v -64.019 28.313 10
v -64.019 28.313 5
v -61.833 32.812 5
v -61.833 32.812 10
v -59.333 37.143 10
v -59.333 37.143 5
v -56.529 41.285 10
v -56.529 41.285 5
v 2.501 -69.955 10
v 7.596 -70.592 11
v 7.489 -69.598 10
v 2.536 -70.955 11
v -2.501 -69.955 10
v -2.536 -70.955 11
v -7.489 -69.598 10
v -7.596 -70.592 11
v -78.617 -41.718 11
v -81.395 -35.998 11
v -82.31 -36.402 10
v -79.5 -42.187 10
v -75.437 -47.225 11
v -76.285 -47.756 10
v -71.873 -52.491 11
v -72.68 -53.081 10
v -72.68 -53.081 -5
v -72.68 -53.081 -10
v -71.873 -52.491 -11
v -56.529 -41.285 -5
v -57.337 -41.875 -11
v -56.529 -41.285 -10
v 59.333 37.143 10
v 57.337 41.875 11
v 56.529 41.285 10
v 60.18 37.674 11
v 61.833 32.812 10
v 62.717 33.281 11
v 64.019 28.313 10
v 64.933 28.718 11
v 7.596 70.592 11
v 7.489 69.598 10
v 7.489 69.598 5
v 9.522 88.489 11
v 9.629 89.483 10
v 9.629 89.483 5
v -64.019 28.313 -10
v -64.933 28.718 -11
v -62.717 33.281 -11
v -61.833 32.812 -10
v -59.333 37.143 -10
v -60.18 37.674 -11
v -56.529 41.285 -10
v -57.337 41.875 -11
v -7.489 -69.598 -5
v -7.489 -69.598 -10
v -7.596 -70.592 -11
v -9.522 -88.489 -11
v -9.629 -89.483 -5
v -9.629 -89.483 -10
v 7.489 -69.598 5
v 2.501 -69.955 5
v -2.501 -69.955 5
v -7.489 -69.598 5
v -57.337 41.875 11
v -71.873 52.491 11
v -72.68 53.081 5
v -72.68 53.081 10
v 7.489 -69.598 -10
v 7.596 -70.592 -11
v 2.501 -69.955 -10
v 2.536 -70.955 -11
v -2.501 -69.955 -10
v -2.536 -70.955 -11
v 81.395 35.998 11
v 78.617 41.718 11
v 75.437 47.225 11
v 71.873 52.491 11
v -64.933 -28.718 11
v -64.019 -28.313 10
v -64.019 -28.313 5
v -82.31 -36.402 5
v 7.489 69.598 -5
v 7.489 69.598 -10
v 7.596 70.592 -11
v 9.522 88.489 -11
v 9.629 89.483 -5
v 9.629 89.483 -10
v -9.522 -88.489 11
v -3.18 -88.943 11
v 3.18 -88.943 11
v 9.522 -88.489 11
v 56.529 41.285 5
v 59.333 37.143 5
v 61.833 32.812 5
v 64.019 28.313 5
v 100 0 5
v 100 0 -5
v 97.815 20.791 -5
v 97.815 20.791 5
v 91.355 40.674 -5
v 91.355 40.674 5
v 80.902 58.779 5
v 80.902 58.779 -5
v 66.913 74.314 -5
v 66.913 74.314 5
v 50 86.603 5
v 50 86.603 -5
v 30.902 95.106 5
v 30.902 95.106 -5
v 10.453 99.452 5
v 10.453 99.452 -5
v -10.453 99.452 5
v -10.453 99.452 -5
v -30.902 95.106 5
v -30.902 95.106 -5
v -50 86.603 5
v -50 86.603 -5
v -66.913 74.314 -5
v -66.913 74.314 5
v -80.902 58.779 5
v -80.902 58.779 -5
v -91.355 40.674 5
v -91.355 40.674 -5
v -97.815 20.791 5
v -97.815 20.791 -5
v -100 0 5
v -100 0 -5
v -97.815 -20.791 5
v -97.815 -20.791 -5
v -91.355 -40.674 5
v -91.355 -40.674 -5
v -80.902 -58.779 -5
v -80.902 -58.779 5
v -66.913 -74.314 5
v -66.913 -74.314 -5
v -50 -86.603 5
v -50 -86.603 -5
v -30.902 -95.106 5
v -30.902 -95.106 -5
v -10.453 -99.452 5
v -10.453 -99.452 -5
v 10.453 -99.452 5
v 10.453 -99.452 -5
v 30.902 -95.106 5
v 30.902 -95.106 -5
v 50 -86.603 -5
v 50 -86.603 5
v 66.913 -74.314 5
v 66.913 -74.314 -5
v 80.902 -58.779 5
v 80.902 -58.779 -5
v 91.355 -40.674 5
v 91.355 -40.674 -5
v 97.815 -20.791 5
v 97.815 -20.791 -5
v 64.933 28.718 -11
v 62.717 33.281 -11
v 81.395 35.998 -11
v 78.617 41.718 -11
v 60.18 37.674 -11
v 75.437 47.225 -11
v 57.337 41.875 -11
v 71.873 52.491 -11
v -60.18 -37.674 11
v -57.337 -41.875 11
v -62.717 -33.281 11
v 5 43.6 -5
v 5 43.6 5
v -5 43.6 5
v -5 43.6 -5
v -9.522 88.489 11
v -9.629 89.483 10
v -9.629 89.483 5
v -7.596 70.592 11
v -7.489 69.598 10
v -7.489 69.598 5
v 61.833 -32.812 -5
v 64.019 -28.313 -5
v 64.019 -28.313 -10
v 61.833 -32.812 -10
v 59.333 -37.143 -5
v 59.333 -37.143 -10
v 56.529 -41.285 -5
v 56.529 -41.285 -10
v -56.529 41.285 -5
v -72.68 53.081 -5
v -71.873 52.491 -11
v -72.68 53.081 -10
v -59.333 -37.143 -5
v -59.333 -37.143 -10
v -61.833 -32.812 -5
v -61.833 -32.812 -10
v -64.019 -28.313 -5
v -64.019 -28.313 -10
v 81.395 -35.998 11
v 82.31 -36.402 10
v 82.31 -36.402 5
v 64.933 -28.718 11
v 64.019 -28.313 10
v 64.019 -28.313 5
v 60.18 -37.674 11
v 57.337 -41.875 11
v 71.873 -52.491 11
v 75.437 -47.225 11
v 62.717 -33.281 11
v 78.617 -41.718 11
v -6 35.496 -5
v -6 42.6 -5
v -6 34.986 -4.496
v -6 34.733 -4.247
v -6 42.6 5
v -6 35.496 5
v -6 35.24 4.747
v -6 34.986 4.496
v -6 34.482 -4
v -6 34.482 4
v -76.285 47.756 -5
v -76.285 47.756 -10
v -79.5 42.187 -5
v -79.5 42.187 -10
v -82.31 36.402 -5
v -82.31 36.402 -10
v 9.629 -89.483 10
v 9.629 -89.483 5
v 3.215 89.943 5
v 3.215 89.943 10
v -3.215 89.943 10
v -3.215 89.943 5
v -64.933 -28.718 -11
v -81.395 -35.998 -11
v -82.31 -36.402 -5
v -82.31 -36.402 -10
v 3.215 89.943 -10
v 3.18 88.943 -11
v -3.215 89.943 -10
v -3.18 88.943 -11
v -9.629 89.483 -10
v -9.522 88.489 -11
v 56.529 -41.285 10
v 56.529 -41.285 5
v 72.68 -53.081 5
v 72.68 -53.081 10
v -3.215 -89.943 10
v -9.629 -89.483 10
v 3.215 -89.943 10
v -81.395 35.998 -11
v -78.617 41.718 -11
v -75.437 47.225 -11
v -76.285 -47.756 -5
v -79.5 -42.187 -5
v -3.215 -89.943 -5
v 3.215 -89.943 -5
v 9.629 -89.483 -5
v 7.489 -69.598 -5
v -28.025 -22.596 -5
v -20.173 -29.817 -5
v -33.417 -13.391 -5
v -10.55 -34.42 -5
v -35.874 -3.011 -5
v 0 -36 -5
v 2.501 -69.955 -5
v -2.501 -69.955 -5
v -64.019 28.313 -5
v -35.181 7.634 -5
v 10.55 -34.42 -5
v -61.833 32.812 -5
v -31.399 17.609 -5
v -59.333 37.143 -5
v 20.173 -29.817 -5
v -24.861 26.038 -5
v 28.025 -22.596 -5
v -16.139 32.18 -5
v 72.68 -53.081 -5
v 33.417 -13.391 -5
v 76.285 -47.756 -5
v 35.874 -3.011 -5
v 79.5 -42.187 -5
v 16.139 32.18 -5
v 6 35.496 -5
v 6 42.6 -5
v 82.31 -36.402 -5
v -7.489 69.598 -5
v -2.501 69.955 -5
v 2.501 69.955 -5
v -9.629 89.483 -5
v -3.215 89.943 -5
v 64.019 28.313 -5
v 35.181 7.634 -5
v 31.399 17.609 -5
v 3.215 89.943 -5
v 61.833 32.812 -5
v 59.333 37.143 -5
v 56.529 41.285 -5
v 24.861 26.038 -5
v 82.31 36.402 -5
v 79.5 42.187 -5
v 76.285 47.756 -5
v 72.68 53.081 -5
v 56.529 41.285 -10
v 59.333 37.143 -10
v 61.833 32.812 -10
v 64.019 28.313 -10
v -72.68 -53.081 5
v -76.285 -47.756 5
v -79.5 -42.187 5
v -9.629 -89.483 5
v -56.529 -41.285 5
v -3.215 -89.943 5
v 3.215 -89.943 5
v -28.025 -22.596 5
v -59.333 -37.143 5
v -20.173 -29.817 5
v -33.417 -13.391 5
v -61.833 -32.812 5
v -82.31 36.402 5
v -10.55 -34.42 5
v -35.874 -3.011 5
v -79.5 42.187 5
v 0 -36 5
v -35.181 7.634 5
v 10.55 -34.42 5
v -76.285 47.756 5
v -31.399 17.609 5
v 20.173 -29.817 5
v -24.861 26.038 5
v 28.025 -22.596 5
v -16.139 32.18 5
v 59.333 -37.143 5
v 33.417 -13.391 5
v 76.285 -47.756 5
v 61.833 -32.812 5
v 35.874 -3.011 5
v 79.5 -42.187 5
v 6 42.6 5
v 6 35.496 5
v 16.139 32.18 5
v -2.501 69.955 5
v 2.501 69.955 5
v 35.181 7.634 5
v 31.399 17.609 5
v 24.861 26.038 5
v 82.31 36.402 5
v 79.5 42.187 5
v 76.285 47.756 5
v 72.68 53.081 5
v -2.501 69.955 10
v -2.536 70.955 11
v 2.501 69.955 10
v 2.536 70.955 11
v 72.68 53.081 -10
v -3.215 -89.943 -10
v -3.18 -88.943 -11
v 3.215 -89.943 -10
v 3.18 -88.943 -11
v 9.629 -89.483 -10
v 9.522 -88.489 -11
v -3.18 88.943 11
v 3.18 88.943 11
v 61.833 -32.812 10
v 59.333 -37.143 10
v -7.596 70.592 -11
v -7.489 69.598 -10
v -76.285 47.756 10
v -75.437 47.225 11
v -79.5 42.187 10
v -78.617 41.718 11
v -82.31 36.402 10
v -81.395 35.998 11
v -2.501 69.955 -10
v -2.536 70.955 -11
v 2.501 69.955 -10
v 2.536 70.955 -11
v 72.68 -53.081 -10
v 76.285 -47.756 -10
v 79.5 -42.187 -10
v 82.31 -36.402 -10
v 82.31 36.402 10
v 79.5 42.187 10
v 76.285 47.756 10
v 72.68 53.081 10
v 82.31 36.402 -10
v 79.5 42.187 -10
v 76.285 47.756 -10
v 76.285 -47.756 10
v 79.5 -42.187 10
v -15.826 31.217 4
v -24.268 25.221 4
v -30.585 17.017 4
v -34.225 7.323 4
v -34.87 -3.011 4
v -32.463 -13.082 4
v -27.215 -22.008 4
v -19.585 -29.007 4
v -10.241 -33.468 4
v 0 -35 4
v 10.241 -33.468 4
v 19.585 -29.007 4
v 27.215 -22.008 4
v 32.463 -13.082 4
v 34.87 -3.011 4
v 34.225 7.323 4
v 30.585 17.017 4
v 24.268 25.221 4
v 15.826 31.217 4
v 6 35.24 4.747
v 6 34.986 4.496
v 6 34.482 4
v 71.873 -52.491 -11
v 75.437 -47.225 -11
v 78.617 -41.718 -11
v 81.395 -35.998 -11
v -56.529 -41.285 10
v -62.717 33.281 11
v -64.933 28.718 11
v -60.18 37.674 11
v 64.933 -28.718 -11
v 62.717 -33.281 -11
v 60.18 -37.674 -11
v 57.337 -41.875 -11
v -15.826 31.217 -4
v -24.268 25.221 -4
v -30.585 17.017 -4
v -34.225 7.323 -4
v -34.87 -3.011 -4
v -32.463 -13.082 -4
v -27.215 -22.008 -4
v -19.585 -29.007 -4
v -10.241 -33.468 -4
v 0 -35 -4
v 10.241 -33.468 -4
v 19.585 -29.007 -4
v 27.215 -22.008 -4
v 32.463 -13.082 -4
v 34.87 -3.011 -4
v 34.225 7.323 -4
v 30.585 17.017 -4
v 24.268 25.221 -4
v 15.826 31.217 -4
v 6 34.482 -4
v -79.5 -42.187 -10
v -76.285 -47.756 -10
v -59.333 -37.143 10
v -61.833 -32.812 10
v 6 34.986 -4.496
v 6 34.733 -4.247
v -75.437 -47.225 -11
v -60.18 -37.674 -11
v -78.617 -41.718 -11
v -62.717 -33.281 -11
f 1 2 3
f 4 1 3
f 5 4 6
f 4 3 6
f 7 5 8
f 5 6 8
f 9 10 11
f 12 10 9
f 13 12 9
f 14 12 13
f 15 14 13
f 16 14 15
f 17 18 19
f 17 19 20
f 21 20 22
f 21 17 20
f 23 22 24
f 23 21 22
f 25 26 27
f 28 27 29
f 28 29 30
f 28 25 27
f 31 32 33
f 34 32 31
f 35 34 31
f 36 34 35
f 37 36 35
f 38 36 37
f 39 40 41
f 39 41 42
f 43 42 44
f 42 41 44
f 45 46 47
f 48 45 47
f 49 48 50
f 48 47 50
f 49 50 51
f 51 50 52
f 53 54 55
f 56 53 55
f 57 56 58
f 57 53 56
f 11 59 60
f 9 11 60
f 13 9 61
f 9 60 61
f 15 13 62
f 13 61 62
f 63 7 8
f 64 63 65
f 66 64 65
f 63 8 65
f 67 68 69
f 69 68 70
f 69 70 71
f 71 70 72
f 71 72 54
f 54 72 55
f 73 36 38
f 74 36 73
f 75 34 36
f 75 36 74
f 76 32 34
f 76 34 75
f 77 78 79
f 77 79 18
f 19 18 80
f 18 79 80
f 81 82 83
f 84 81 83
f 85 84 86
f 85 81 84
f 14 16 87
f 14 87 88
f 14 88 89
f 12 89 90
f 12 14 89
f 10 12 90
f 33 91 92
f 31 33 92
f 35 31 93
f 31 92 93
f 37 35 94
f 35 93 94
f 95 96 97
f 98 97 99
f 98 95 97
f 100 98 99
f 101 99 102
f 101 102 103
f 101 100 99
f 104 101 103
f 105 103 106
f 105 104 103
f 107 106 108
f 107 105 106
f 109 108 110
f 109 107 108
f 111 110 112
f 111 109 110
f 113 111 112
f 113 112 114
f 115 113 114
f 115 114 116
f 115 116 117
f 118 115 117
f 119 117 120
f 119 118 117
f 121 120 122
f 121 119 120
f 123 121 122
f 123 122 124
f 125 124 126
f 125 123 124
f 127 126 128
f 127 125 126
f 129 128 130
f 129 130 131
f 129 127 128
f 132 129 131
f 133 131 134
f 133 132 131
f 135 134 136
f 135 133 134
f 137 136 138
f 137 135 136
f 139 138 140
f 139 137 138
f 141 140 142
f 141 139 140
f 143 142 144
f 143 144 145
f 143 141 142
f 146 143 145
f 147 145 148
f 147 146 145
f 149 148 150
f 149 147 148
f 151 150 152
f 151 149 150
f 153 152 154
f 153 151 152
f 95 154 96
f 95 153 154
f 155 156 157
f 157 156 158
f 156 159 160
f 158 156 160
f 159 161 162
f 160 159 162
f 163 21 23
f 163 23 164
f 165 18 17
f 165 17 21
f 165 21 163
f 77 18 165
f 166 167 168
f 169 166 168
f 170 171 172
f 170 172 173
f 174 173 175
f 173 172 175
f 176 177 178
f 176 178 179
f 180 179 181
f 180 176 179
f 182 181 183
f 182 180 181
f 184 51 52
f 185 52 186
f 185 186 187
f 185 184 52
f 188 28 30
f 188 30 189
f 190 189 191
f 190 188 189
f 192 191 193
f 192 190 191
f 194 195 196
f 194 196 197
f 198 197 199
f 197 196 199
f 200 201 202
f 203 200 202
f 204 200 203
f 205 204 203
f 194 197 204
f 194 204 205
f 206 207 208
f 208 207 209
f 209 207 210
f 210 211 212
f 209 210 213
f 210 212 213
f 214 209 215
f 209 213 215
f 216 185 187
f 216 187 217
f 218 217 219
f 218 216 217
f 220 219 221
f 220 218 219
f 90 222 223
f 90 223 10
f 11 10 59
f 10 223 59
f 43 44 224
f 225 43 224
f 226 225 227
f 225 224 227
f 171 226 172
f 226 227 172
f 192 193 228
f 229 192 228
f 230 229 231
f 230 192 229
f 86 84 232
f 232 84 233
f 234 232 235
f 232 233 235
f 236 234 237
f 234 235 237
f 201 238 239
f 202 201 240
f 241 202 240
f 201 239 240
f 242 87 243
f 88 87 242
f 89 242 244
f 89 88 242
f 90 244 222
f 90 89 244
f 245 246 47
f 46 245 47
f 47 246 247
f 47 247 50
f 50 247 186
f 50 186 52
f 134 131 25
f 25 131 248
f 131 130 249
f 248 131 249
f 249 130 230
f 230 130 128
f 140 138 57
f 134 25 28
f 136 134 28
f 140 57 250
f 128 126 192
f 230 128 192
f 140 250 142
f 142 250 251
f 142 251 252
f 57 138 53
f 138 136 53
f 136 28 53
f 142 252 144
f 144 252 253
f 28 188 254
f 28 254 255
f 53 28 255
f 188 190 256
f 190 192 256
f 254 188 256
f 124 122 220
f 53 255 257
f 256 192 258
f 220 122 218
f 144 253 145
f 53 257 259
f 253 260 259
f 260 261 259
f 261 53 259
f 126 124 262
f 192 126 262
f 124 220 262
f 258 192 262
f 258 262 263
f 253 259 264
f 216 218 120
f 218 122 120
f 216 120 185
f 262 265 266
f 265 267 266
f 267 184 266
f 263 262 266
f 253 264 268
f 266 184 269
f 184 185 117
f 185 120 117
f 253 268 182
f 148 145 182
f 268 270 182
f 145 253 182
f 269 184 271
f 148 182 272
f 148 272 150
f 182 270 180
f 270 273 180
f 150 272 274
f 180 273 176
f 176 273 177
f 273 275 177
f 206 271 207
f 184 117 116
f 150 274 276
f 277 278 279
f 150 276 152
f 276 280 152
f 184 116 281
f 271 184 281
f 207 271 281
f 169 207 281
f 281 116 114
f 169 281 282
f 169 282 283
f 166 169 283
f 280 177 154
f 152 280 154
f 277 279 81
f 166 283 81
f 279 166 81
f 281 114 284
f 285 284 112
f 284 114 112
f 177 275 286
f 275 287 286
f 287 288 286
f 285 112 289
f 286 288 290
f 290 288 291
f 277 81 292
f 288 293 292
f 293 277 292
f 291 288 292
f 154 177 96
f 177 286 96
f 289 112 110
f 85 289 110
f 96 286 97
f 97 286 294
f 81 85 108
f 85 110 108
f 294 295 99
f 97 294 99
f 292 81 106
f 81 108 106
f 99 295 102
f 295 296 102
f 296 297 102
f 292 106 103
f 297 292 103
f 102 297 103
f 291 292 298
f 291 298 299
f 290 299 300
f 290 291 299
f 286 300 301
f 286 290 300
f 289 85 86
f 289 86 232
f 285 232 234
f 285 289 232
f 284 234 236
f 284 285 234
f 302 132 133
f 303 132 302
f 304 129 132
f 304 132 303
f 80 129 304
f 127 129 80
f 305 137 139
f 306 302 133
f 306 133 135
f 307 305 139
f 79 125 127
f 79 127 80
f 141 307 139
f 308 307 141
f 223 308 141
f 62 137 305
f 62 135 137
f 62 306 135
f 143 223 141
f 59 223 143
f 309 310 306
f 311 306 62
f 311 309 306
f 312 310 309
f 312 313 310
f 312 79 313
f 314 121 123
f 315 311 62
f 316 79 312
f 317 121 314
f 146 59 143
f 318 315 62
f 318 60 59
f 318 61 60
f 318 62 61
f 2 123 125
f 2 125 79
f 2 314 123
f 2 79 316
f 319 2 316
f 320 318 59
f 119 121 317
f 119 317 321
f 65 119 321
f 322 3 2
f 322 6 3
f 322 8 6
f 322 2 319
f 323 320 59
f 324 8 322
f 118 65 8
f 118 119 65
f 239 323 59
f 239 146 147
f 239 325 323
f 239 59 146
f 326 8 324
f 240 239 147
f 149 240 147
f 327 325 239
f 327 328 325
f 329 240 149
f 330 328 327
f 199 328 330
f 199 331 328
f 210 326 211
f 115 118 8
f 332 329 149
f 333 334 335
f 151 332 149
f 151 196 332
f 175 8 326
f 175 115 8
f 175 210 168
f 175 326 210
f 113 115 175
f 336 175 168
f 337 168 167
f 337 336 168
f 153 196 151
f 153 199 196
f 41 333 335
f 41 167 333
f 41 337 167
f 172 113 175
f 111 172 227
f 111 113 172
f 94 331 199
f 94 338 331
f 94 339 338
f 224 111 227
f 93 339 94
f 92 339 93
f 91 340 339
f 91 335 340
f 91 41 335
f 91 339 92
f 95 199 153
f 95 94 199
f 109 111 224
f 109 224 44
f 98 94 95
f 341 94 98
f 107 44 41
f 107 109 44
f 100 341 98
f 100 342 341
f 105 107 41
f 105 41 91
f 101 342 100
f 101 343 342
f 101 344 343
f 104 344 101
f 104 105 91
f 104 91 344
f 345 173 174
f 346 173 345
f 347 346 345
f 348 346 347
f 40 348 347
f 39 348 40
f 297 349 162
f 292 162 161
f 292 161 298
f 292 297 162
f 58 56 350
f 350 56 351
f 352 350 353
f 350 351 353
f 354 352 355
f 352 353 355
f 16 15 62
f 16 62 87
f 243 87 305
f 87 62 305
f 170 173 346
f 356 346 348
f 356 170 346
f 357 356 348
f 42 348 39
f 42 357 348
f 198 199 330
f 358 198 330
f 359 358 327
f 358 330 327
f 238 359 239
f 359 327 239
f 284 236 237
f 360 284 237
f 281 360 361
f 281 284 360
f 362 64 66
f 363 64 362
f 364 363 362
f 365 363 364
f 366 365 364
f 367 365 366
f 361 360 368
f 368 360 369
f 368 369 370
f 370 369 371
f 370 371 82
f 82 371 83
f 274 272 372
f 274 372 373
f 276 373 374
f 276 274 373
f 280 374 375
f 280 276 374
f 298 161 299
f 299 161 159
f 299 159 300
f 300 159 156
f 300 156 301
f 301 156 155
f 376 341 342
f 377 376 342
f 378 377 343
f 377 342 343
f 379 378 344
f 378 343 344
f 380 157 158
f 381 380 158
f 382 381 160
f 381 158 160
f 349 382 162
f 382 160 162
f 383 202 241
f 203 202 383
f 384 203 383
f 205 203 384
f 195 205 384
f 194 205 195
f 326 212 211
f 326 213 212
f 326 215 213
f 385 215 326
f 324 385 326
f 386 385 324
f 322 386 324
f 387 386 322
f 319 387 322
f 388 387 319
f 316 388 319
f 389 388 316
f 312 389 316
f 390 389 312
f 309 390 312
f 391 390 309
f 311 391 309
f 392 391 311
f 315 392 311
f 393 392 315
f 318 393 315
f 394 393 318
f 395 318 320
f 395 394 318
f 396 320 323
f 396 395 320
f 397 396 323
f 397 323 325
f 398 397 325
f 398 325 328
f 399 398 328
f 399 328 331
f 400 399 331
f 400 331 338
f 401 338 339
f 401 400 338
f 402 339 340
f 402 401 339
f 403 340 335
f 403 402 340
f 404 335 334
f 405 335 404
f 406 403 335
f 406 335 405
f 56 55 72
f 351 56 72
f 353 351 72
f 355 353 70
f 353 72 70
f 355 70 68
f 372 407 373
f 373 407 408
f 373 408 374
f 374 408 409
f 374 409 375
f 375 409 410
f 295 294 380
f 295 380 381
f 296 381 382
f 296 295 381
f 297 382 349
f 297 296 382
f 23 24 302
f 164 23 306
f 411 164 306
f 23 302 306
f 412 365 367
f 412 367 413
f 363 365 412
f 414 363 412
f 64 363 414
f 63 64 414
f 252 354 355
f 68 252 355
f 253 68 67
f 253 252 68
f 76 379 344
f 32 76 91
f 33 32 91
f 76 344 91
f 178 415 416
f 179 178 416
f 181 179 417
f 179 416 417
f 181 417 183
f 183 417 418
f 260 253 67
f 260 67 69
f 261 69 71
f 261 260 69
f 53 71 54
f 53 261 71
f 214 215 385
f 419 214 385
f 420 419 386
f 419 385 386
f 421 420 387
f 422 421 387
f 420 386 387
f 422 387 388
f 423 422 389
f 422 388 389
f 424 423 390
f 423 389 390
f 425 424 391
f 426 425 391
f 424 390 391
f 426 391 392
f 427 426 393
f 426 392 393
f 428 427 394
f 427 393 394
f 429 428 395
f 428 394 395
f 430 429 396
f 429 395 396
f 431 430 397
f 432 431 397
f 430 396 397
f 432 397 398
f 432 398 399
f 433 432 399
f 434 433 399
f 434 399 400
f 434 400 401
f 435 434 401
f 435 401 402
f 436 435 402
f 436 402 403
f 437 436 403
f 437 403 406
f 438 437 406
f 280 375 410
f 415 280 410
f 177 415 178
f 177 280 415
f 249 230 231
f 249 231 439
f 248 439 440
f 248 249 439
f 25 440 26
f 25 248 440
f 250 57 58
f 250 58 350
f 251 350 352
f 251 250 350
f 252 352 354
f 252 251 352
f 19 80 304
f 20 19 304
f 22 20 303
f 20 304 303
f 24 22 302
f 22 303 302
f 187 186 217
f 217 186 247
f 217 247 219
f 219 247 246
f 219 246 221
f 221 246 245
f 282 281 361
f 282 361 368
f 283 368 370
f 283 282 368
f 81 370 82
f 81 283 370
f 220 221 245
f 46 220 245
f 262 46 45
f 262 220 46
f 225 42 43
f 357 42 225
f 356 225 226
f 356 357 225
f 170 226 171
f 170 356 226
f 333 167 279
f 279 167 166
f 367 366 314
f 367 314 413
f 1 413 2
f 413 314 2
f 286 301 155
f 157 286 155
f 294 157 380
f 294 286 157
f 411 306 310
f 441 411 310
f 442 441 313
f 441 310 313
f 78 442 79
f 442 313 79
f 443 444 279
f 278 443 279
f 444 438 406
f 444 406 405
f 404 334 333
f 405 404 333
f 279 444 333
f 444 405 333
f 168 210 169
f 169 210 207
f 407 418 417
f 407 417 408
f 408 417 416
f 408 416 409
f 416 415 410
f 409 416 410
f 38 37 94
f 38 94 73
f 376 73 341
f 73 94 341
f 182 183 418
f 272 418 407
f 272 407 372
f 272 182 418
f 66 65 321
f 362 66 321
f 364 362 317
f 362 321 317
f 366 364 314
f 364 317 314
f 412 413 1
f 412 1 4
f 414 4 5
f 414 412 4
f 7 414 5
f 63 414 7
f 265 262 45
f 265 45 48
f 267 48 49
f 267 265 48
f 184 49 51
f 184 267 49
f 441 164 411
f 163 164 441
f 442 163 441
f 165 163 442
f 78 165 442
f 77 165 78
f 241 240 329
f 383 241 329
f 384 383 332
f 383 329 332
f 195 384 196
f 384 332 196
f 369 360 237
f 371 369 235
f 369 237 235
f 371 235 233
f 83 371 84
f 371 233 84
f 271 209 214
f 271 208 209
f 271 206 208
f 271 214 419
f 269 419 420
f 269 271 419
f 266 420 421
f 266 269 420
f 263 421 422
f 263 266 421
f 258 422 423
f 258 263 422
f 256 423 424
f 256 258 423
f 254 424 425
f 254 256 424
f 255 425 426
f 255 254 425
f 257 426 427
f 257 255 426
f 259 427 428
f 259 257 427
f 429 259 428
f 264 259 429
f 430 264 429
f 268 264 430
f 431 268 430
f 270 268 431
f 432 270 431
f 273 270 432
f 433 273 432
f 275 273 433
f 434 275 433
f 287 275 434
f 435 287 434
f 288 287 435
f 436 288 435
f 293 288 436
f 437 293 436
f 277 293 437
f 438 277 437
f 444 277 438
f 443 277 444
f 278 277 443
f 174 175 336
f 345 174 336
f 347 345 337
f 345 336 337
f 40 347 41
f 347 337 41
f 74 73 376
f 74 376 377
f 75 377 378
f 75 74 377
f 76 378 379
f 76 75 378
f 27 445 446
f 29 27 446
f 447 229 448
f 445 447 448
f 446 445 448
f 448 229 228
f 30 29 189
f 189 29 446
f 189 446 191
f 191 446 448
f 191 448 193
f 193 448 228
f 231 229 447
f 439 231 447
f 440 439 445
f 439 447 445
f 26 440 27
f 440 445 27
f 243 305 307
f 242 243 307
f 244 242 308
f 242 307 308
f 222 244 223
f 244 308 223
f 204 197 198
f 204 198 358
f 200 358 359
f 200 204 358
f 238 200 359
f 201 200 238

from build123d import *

# Parameters (mm, degrees)
SKETCH1_R                = 100
BOSS_EXTRUDE1_DEPTH      = 5
CUT_EXTRUDE1_DEPTH       = 11
BOSS_EXTRUDE3_DEPTH      = 6
CHAMFER1_SIZE            = 1
CHAMFER2_SIZE            = 1
CHAMFER3_SIZE            = 1
CHAMFER1_OF_MIRROR1_SIZE = 1


with BuildPart() as part:
    # Sketch1 → Boss-Extrude1 (new body, symmetric)
    with BuildSketch(Plane.XY):
        Circle(SKETCH1_R)
    extrude(amount=BOSS_EXTRUDE1_DEPTH, both=True)

    # Sketch2 → Cut-Extrude1 (cut, through all)
    with BuildSketch(Plane.XY.offset(5)):
        with BuildLine():
            Line((6, 34.481879299), (6, 43.6))
            Line((6, 43.6), (-6, 43.6))
            Line((-6, 43.6), (-6, 34.481879299))
            ThreePointArc((-6, 34.481879299), (0, -35), (6, 34.481879299))
        make_face()
    extrude(amount=-CUT_EXTRUDE1_DEPTH, mode=Mode.SUBTRACT)

    # Sketch3 → Boss-Extrude3 (add)
    with BuildSketch(Plane.XY.offset(5)):
        with BuildLine():
            ThreePointArc((-7.489441028, 69.598191593), (0, 70), (7.489441028, 69.598191593))
            Line((7.489441028, 69.598191593), (9.629281322, 89.483389192))
            ThreePointArc((9.629281322, 89.483389192), (0, 90), (-9.629281322, 89.483389192))
            Line((-9.629281322, 89.483389192), (-7.489441028, 69.598191593))
        make_face()
        with BuildLine():
            ThreePointArc((-64.018522492, 28.313049606), (-60.621778265, 35), (-56.529081463, 41.285141987))
            Line((-56.529081463, 41.285141987), (-72.680247596, 53.080896841))
            ThreePointArc((-72.680247596, 53.080896841), (-77.942286341, 45), (-82.309528918, 36.402492351))
            Line((-82.309528918, 36.402492351), (-64.018522492, 28.313049606))
        make_face()
        with BuildLine():
            ThreePointArc((-56.529081463, -41.285141987), (-60.621778265, -35), (-64.018522492, -28.313049606))
            Line((-64.018522492, -28.313049606), (-82.309528918, -36.402492351))
            ThreePointArc((-82.309528918, -36.402492351), (-77.942286341, -45), (-72.680247596, -53.080896841))
            Line((-72.680247596, -53.080896841), (-56.529081463, -41.285141987))
        make_face()
        with BuildLine():
            ThreePointArc((7.489441028, -69.598191593), (0, -70), (-7.489441028, -69.598191593))
            Line((-7.489441028, -69.598191593), (-9.629281322, -89.483389192))
            ThreePointArc((-9.629281322, -89.483389192), (0, -90), (9.629281322, -89.483389192))
            Line((9.629281322, -89.483389192), (7.489441028, -69.598191593))
        make_face()
        with BuildLine():
            ThreePointArc((64.018522492, -28.313049606), (60.621778265, -35), (56.529081463, -41.285141987))
            Line((56.529081463, -41.285141987), (72.680247596, -53.080896841))
            ThreePointArc((72.680247596, -53.080896841), (77.942286341, -45), (82.309528918, -36.402492351))
            Line((82.309528918, -36.402492351), (64.018522492, -28.313049606))
        make_face()
        with BuildLine():
            ThreePointArc((56.529081463, 41.285141987), (60.621778265, 35), (64.018522492, 28.313049606))
            Line((64.018522492, 28.313049606), (82.309528918, 36.402492351))
            ThreePointArc((82.309528918, 36.402492351), (77.942286341, 45), (72.680247596, 53.080896841))
            Line((72.680247596, 53.080896841), (56.529081463, 41.285141987))
        make_face()
    boss_extrude3 = extrude(amount=BOSS_EXTRUDE3_DEPTH)

    # Chamfer1
    chamfer1_edges = [part.edges().sort_by_distance(p)[0] for p in [
        (0, 70, 11),
        (0, 90, 11),
        (-60.621778265, 35, 11),
        (-77.942286341, 45, 11),
        (-60.621778265, -35, 11),
        (-77.942286341, -45, 11),
        (0, -70, 11),
        (0, -90, 11),
        (60.621778265, -35, 11),
        (77.942286341, -45, 11),
        (60.621778265, 35, 11),
        (77.942286341, 45, 11),
    ]]
    chamfer(chamfer1_edges, length=CHAMFER1_SIZE)

    # Chamfer2
    chamfer2_edges = [part.edges().sort_by_distance(p)[0] for p in [
        (0, -35, -5),
        (0, -35, 5),
    ]]
    chamfer(chamfer2_edges, length=CHAMFER2_SIZE)

    # Chamfer3
    chamfer3_edges = [part.edges().sort_by_distance(p)[0] for p in [
        (-6, 43.6, 0),
        (6, 43.6, 0),
    ]]
    chamfer(chamfer3_edges, length=CHAMFER3_SIZE)

    # Mirror1: Boss-Extrude3 across plane
    add(boss_extrude3.mirror(Plane.XY))

    # Chamfer1 of Mirror1
    chamfer1_of_mirror1_edges = [part.edges().sort_by_distance(p)[0] for p in [
        (0, 70, -11),
        (0, 90, -11),
        (-60.621778265, 35, -11),
        (-77.942286341, 45, -11),
        (-60.621778265, -35, -11),
        (-77.942286341, -45, -11),
        (0, -70, -11),
        (0, -90, -11),
        (60.621778265, -35, -11),
        (77.942286341, -45, -11),
        (60.621778265, 35, -11),
        (77.942286341, 45, -11),
    ]]
    chamfer(chamfer1_of_mirror1_edges, length=CHAMFER1_OF_MIRROR1_SIZE)


solid = part.part
